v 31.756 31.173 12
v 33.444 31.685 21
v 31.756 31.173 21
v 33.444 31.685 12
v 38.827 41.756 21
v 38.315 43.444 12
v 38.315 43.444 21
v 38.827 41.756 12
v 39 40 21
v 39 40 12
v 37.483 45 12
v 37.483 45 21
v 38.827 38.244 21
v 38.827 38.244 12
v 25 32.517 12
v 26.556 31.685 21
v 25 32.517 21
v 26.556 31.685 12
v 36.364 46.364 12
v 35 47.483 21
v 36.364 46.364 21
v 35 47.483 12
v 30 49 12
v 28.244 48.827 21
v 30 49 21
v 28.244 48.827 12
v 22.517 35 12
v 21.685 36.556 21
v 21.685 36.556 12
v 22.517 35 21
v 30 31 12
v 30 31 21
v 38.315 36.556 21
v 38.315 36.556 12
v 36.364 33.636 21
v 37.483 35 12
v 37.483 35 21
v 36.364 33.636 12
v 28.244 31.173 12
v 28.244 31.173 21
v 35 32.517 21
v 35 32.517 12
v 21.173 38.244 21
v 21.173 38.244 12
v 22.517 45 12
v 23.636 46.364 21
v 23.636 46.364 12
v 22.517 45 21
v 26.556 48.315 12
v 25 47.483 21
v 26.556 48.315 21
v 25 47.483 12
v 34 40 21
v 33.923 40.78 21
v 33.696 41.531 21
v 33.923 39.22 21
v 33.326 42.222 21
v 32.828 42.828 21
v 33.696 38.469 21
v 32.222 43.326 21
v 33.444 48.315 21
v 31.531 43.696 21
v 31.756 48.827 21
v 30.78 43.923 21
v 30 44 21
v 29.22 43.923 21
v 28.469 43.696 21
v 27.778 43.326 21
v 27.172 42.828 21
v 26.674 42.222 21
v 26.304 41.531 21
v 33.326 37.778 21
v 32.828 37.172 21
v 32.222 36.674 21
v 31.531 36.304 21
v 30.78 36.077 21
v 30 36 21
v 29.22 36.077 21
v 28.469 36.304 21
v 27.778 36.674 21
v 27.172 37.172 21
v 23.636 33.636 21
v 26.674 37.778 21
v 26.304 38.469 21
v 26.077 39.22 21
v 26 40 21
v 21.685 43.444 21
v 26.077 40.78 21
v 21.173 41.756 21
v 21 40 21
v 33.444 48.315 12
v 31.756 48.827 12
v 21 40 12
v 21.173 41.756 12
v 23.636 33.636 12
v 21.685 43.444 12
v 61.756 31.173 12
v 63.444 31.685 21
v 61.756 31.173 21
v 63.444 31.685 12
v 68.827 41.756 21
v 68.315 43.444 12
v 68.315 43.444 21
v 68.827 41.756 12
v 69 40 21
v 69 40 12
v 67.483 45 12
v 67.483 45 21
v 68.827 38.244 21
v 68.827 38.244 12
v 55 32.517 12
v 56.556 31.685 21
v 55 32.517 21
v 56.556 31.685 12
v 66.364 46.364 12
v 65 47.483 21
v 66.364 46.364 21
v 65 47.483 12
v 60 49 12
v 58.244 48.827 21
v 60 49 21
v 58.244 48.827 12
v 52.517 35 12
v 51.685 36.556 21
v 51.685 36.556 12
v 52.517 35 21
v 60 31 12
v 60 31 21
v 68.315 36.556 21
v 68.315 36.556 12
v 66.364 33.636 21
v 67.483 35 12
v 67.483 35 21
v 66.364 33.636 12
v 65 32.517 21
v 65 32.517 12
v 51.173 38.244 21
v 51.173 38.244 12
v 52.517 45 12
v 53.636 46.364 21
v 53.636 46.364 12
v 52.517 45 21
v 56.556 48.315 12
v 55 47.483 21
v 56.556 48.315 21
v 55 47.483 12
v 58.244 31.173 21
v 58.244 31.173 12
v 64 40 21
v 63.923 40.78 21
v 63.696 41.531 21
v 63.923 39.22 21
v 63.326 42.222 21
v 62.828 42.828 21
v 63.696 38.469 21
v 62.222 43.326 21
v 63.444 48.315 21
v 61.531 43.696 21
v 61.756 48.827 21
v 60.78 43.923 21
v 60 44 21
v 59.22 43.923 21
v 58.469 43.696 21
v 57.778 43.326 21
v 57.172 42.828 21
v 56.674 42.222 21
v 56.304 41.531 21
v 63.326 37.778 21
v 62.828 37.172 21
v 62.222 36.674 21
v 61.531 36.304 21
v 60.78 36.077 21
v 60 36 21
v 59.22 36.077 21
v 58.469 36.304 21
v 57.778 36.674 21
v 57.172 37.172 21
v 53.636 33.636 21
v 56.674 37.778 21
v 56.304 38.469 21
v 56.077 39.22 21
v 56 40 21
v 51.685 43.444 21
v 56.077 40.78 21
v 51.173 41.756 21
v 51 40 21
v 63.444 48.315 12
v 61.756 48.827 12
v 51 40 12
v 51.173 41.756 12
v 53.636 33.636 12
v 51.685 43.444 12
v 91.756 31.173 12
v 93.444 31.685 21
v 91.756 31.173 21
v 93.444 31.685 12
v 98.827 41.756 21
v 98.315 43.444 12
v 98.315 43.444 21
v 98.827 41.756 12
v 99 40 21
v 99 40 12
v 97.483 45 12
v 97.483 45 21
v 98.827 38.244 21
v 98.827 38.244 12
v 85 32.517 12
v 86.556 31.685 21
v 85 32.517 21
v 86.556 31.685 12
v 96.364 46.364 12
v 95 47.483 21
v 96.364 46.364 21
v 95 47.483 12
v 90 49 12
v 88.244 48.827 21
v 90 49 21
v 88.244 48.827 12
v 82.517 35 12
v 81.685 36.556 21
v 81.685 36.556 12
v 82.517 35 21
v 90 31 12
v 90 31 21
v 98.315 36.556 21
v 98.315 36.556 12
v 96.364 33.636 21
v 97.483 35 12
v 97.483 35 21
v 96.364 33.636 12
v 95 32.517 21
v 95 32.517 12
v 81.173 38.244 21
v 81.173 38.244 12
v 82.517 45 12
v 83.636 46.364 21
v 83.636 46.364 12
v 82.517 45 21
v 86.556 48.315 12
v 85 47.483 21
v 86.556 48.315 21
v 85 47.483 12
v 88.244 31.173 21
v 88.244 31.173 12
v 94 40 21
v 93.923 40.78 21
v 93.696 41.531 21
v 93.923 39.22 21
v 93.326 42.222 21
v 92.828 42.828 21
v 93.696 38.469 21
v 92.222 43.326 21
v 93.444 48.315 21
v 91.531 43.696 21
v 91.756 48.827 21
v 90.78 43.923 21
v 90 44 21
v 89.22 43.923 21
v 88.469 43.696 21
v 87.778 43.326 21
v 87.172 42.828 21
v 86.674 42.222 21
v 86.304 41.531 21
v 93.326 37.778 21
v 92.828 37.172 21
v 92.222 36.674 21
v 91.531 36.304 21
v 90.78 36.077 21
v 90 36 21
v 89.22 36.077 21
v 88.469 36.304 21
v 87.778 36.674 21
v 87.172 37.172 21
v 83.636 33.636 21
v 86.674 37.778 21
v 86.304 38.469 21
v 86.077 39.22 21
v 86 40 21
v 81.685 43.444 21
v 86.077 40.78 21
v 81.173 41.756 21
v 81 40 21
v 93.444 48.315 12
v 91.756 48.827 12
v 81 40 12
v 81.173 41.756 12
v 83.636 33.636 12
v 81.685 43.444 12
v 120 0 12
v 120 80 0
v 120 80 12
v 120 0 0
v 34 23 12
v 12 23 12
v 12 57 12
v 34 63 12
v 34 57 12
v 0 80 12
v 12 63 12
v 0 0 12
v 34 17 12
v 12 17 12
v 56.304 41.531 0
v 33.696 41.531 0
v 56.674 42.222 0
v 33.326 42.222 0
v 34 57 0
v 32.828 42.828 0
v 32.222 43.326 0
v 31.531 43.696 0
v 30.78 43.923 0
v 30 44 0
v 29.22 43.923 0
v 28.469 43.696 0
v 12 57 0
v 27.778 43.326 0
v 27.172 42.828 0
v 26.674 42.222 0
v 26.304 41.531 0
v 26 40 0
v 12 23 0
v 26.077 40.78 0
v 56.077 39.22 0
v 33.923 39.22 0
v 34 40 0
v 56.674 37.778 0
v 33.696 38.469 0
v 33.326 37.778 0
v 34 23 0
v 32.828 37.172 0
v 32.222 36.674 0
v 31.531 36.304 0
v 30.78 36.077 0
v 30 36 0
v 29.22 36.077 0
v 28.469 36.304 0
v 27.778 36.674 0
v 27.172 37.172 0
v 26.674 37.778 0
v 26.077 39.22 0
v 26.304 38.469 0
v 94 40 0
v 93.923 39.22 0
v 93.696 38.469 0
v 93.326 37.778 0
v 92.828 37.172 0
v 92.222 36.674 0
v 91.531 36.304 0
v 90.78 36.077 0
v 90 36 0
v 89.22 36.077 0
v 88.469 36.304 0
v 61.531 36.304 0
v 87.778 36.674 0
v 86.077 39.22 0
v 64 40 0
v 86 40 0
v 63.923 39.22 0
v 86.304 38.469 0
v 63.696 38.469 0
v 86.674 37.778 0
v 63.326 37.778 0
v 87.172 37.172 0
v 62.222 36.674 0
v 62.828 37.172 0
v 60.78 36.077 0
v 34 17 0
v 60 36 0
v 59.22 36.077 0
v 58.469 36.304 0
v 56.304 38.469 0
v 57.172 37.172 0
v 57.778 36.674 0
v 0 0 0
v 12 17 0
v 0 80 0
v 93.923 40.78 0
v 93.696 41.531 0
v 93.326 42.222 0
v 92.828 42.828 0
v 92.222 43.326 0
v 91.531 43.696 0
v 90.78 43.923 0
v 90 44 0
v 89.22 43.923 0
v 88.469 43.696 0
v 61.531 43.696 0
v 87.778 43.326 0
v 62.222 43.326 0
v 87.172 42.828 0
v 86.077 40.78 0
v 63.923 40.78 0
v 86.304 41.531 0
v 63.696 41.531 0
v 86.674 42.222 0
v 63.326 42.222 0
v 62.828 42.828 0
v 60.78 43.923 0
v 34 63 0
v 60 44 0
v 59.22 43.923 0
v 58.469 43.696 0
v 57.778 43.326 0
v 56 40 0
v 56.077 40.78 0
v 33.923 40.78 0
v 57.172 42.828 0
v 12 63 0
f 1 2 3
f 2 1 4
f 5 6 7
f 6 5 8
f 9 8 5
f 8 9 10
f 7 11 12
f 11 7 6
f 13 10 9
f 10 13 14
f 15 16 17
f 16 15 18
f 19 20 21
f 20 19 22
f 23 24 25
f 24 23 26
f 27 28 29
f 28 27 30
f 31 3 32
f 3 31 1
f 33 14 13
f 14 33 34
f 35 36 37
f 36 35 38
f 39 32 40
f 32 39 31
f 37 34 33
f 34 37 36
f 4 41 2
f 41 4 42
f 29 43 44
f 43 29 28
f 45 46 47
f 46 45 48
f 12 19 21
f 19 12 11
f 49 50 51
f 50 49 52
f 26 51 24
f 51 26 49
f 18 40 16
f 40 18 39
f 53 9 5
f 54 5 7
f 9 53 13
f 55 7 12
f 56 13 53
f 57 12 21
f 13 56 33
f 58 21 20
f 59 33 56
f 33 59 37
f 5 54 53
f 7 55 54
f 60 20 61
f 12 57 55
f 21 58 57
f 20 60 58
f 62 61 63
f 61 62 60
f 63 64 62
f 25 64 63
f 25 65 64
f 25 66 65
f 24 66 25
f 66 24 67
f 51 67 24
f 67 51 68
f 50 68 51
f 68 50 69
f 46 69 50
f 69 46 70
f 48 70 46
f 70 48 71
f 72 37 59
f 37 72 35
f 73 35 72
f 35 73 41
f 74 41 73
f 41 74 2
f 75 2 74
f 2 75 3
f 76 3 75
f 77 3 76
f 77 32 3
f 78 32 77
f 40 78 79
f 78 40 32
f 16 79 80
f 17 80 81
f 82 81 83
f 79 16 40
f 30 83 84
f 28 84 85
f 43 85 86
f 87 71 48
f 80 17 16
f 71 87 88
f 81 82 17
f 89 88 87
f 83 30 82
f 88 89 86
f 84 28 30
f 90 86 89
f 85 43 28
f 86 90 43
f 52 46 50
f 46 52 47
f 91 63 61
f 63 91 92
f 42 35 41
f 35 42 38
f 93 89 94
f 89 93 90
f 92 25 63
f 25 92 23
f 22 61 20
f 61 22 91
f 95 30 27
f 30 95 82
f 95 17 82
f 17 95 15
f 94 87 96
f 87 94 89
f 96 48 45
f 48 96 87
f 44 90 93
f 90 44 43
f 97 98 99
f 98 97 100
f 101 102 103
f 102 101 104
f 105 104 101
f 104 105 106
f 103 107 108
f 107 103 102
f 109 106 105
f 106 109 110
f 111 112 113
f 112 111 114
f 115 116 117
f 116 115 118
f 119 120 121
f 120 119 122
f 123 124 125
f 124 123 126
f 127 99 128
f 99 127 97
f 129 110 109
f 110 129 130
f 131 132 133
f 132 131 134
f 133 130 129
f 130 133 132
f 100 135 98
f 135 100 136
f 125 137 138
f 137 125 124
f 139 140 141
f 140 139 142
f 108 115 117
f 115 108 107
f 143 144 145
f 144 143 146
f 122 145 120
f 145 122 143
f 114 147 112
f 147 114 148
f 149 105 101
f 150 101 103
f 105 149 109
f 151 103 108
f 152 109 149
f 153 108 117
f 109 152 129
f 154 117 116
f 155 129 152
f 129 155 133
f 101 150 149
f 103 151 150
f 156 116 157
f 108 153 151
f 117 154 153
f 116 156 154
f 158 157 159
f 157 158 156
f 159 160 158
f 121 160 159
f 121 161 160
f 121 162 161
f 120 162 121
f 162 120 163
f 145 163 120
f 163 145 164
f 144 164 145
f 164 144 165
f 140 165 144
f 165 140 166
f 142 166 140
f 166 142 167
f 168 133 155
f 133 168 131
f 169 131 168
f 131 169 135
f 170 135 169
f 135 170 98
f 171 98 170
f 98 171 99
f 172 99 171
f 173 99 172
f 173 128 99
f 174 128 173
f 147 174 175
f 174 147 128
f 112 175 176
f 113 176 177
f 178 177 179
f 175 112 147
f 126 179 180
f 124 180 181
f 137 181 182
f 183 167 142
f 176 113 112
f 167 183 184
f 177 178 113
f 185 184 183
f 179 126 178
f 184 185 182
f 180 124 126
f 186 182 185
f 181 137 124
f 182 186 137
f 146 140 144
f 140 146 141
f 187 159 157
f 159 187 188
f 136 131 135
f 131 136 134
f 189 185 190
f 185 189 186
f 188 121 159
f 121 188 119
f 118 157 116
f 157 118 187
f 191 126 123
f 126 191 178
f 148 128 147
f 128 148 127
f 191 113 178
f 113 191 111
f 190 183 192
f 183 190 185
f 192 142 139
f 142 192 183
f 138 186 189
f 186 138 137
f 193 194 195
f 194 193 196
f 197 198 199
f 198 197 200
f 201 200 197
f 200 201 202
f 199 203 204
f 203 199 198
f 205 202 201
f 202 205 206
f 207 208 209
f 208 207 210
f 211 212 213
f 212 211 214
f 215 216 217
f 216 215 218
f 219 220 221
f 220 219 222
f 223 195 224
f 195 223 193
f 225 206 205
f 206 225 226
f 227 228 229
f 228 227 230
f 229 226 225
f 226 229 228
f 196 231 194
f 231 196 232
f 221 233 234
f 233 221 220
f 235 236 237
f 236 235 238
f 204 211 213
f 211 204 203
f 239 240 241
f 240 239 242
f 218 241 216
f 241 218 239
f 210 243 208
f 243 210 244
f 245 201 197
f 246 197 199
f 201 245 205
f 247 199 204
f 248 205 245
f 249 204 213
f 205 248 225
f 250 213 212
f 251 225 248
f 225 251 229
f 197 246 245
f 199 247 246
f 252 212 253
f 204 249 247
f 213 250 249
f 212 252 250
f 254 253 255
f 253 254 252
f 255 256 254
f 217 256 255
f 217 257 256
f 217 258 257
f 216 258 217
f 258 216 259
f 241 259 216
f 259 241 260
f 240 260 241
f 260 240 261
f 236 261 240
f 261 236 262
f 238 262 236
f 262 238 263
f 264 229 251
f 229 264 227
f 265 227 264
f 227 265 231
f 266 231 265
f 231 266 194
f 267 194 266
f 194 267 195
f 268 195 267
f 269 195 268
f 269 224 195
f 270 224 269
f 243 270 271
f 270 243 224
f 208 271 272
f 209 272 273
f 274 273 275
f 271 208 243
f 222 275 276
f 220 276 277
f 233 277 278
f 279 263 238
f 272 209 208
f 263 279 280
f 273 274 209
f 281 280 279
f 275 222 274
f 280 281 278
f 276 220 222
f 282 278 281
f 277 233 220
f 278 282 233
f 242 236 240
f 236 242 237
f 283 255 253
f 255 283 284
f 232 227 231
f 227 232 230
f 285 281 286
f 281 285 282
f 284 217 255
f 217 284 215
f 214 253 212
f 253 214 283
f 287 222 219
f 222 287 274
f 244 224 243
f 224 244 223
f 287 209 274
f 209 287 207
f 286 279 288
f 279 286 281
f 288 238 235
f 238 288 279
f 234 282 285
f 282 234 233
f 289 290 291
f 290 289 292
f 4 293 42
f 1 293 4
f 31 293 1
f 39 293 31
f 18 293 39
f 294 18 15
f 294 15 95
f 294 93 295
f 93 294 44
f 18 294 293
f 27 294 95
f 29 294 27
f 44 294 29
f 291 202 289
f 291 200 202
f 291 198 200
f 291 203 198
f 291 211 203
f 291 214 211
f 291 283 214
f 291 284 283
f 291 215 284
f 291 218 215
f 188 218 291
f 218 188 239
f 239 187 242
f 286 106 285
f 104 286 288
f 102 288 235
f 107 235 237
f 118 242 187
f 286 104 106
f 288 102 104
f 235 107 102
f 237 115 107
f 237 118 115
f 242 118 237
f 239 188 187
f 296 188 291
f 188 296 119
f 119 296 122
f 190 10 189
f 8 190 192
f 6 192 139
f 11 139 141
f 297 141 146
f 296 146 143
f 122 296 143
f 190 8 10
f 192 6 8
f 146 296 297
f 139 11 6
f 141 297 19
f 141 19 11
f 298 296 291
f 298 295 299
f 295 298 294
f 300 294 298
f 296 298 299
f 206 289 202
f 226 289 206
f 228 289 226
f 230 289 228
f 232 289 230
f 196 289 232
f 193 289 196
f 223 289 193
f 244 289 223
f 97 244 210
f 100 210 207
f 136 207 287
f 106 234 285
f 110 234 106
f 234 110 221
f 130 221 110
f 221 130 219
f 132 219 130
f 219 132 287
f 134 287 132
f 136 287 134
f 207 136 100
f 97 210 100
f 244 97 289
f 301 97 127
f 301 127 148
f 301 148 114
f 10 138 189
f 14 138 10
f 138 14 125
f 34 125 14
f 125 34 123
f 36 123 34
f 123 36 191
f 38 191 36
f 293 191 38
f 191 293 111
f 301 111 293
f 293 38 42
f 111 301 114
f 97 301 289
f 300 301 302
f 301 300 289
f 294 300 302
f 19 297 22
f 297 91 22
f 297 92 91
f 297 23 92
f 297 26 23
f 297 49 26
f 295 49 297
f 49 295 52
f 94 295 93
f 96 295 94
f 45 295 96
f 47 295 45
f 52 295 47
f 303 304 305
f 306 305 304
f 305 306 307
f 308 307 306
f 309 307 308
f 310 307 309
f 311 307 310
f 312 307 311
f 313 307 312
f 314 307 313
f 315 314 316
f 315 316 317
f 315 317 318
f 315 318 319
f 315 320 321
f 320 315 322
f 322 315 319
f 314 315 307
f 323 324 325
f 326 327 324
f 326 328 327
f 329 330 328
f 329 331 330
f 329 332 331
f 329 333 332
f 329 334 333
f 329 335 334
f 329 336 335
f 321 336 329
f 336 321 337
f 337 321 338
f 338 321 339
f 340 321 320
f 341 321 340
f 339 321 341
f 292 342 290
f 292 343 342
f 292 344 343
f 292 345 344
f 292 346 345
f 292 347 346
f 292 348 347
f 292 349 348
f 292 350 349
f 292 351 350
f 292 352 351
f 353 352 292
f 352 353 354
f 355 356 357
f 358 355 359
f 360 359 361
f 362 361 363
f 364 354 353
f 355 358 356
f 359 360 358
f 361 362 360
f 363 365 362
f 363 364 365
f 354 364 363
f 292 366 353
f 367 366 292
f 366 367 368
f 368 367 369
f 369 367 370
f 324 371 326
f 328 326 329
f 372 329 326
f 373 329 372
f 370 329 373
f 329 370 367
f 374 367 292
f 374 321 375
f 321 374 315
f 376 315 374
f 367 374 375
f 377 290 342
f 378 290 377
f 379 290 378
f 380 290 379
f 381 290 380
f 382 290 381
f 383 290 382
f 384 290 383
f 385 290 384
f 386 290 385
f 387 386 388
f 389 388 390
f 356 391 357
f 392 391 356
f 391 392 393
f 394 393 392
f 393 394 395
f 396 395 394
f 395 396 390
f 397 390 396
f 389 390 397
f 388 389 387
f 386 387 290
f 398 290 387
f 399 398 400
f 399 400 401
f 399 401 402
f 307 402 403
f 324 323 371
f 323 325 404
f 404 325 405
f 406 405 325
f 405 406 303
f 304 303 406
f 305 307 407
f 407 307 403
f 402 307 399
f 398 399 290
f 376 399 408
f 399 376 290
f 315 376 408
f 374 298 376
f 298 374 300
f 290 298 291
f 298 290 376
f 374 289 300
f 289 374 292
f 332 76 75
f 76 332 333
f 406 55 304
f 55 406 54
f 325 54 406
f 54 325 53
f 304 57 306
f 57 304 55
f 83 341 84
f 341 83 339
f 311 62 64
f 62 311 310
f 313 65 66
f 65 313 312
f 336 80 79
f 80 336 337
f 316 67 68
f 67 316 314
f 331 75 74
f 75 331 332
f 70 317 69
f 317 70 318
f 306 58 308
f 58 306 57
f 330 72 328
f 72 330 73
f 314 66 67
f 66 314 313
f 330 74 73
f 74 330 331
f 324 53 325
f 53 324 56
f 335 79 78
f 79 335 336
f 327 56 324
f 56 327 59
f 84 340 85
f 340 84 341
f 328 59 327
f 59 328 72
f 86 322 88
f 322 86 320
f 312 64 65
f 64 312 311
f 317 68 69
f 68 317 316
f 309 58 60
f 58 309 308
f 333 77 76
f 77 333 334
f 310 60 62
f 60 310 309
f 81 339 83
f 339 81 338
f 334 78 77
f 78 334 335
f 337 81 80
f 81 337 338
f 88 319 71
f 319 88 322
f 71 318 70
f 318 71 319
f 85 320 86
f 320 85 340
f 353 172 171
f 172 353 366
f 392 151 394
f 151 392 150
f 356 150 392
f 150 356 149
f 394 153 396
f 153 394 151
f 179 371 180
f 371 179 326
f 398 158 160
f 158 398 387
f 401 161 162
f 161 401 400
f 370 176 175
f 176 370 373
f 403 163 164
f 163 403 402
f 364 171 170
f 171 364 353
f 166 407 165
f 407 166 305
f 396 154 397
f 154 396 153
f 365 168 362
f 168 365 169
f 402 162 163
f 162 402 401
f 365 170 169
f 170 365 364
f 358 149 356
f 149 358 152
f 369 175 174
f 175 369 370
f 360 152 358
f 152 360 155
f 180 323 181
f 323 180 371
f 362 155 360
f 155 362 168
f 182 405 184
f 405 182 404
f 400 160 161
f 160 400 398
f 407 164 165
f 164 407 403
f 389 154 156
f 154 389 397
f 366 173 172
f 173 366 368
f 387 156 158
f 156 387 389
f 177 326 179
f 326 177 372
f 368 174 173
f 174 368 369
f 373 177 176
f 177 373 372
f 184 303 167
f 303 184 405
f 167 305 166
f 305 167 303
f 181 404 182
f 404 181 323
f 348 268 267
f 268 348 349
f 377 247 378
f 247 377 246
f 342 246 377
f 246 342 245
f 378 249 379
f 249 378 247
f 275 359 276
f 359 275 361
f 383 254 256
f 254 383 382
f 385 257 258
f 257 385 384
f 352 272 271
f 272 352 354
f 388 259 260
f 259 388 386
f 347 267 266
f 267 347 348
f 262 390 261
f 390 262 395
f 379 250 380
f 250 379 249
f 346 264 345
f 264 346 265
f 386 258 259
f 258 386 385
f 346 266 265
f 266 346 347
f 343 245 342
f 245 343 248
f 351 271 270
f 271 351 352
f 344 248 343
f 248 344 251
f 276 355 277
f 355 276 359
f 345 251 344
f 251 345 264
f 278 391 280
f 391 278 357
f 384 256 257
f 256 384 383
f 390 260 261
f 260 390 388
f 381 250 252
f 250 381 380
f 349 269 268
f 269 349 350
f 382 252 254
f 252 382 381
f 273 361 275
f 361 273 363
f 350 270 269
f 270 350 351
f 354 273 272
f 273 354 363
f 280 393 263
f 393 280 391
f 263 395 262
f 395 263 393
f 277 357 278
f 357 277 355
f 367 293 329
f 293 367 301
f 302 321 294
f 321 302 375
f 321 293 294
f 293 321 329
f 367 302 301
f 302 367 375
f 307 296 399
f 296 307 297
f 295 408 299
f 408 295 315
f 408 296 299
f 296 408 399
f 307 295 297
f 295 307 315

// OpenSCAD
$fn = 32;

// ----------------------------------------------------------------------
// Drill jig: three_boss_slot jig
// ----------------------------------------------------------------------

// --- parameters (mm) ---
plate_l = 120;            // plate length, X
plate_w = 80;             // plate width, Y
plate_t = 12;             // plate thickness
boss_d = 18;              // guide boss diameter
boss_h = 10;              // boss height above the plate
guide_d = 8;              // guide hole diameter
boss_pitch = 30;          // boss pitch
slot_w = 6;               // clamp slot width
slot_l = 22;              // clamp slot length
slot_x = 12;              // slot start X

n_boss = 3;  // guide bosses
boss_x0 = (plate_l - (n_boss - 1) * boss_pitch) / 2;  // first boss X
boss_top = plate_t - 1 + boss_h;  // boss crown height
total_h = boss_top;  // overall height

difference() {
  union() {
  cube([plate_l, plate_w, plate_t]);
  for (i = [0 : n_boss - 1])
    translate([boss_x0 + i * boss_pitch, plate_w / 2, plate_t - 1])
      cylinder(h = boss_h, d = boss_d);
  }
  for (i = [0 : n_boss - 1])
    translate([boss_x0 + i * boss_pitch, plate_w / 2, -1])
      cylinder(h = plate_t + boss_h, d = guide_d);
  for (cy = [plate_w * 0.25, plate_w * 0.75])
    translate([slot_x, cy - slot_w / 2, -1])
      cube([slot_l, slot_w, plate_t + 2]);
}
